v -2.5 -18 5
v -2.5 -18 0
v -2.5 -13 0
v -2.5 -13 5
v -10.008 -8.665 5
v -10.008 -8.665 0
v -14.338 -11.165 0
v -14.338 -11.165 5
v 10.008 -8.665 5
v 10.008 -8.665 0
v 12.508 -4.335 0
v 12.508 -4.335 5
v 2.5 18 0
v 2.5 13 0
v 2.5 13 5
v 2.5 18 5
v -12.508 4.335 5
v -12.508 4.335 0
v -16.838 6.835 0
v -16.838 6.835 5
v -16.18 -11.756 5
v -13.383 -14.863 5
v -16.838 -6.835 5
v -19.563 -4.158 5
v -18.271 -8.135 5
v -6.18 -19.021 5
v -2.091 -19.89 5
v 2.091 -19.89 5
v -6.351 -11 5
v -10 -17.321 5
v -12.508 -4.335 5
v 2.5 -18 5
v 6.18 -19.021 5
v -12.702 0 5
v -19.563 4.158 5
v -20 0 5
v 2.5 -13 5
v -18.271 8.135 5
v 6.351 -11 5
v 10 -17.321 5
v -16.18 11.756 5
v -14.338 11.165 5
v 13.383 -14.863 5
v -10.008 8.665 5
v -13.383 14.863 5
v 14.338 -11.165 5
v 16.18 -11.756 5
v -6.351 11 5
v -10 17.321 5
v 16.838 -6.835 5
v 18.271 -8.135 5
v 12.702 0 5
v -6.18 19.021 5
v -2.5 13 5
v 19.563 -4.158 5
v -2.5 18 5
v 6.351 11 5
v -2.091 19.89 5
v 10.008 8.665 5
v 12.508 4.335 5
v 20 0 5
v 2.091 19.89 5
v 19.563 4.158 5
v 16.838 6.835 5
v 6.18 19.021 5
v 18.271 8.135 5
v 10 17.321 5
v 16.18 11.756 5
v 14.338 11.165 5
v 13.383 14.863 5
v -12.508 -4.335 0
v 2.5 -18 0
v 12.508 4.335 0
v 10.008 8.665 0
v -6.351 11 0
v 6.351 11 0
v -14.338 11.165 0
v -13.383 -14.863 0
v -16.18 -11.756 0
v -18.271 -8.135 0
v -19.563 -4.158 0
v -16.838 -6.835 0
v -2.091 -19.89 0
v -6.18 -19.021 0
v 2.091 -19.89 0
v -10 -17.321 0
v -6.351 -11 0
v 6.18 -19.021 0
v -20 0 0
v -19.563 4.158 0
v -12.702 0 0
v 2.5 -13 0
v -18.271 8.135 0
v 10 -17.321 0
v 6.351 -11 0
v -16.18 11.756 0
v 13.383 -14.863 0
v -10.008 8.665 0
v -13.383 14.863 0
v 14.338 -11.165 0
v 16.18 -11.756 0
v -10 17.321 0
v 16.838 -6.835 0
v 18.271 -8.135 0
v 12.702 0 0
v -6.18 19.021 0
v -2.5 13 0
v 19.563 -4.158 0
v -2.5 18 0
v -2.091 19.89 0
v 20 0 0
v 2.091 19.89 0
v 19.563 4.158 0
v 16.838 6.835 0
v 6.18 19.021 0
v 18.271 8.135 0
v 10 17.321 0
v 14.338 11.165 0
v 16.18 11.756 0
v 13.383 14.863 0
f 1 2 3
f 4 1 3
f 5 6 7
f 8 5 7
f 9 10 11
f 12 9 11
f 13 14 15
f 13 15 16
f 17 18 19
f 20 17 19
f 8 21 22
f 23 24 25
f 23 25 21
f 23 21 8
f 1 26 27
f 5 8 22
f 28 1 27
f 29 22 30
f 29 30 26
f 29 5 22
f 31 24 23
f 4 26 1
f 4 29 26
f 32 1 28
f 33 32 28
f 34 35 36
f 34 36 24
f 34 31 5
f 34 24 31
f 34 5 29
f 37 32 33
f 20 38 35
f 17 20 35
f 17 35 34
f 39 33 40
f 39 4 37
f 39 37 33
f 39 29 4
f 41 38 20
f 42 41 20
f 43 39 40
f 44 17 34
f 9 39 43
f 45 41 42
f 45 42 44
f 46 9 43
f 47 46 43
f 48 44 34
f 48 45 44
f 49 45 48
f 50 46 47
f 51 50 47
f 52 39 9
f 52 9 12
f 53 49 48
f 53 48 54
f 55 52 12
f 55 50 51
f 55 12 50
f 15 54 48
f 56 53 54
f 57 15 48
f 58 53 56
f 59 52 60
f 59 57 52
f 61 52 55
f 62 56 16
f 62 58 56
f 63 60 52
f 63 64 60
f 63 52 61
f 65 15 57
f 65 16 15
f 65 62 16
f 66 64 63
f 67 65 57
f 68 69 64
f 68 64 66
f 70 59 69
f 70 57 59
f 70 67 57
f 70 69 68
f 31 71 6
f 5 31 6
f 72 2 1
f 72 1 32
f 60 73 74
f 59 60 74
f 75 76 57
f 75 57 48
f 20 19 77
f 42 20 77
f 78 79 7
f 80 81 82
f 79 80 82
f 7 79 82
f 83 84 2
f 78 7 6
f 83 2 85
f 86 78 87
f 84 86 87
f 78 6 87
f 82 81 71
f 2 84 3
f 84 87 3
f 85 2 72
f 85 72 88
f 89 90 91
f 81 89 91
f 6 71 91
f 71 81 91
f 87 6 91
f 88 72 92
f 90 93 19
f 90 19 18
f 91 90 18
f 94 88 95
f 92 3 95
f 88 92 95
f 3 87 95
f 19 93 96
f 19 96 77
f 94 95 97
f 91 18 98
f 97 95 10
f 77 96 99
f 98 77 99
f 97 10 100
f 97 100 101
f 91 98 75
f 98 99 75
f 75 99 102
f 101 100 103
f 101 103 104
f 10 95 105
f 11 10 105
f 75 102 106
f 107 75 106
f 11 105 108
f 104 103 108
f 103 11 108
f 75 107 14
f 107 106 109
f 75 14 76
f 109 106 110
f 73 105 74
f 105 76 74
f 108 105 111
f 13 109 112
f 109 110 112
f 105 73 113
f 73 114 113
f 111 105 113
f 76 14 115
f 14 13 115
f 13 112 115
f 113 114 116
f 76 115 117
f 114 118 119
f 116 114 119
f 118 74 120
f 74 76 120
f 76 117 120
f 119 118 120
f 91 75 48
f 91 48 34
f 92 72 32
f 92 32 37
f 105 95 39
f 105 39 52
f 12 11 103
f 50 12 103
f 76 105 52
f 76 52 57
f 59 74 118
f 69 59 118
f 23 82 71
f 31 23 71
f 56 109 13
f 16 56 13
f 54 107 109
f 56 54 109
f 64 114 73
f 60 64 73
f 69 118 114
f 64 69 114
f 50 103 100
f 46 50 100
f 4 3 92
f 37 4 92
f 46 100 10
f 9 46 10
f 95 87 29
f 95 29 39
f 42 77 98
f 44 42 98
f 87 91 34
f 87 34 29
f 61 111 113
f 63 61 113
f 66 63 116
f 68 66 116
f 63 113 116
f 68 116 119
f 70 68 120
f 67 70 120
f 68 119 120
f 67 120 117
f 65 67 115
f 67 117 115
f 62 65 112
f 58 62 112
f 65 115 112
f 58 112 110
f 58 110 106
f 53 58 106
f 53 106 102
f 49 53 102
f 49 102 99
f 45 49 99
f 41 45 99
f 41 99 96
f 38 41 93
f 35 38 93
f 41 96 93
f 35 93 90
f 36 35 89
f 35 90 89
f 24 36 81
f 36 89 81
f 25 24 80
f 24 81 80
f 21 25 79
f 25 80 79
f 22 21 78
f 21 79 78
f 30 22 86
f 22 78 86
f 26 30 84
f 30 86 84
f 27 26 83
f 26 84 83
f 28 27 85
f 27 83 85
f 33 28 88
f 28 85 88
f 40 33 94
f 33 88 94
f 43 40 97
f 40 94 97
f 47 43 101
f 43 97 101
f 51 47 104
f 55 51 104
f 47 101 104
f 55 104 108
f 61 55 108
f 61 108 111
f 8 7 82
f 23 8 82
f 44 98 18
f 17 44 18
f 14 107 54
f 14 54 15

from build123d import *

# Parameters (mm, degrees)
SKETCH1_R           = 20
SKETCH1_W           = 5
SKETCH1_H           = 5
BOSS_EXTRUDE1_DEPTH = 5


with BuildPart() as part:
    # Sketch1 → Boss-Extrude1 (new body)
    with BuildSketch(Plane.XY):
        Circle(SKETCH1_R)
        Polygon((12.701705922, 0), (6.350852961, 11), (-6.350852961, 11), (-12.701705922, 0), (-6.350852961, -11), (6.350852961, -11), align=None, mode=Mode.SUBTRACT)
        with Locations((0, 15.5)):
            Rectangle(SKETCH1_W, SKETCH1_H, mode=Mode.SUBTRACT)
        Polygon((16.838457268, 6.834936491), (12.508330249, 4.334936491), (10.008330249, 8.665063509), (14.338457268, 11.165063509), align=None, mode=Mode.SUBTRACT)
        Polygon((14.338457268, -11.165063509), (10.008330249, -8.665063509), (12.508330249, -4.334936491), (16.838457268, -6.834936491), align=None, mode=Mode.SUBTRACT)
        with Locations((0, -15.5)):
            Rectangle(SKETCH1_W, SKETCH1_H, mode=Mode.SUBTRACT)
        Polygon((-16.838457268, -6.834936491), (-12.508330249, -4.334936491), (-10.008330249, -8.665063509), (-14.338457268, -11.165063509), align=None, mode=Mode.SUBTRACT)
        Polygon((-14.338457268, 11.165063509), (-10.008330249, 8.665063509), (-12.508330249, 4.334936491), (-16.838457268, 6.834936491), align=None, mode=Mode.SUBTRACT)
    extrude(amount=BOSS_EXTRUDE1_DEPTH)


solid = part.part
